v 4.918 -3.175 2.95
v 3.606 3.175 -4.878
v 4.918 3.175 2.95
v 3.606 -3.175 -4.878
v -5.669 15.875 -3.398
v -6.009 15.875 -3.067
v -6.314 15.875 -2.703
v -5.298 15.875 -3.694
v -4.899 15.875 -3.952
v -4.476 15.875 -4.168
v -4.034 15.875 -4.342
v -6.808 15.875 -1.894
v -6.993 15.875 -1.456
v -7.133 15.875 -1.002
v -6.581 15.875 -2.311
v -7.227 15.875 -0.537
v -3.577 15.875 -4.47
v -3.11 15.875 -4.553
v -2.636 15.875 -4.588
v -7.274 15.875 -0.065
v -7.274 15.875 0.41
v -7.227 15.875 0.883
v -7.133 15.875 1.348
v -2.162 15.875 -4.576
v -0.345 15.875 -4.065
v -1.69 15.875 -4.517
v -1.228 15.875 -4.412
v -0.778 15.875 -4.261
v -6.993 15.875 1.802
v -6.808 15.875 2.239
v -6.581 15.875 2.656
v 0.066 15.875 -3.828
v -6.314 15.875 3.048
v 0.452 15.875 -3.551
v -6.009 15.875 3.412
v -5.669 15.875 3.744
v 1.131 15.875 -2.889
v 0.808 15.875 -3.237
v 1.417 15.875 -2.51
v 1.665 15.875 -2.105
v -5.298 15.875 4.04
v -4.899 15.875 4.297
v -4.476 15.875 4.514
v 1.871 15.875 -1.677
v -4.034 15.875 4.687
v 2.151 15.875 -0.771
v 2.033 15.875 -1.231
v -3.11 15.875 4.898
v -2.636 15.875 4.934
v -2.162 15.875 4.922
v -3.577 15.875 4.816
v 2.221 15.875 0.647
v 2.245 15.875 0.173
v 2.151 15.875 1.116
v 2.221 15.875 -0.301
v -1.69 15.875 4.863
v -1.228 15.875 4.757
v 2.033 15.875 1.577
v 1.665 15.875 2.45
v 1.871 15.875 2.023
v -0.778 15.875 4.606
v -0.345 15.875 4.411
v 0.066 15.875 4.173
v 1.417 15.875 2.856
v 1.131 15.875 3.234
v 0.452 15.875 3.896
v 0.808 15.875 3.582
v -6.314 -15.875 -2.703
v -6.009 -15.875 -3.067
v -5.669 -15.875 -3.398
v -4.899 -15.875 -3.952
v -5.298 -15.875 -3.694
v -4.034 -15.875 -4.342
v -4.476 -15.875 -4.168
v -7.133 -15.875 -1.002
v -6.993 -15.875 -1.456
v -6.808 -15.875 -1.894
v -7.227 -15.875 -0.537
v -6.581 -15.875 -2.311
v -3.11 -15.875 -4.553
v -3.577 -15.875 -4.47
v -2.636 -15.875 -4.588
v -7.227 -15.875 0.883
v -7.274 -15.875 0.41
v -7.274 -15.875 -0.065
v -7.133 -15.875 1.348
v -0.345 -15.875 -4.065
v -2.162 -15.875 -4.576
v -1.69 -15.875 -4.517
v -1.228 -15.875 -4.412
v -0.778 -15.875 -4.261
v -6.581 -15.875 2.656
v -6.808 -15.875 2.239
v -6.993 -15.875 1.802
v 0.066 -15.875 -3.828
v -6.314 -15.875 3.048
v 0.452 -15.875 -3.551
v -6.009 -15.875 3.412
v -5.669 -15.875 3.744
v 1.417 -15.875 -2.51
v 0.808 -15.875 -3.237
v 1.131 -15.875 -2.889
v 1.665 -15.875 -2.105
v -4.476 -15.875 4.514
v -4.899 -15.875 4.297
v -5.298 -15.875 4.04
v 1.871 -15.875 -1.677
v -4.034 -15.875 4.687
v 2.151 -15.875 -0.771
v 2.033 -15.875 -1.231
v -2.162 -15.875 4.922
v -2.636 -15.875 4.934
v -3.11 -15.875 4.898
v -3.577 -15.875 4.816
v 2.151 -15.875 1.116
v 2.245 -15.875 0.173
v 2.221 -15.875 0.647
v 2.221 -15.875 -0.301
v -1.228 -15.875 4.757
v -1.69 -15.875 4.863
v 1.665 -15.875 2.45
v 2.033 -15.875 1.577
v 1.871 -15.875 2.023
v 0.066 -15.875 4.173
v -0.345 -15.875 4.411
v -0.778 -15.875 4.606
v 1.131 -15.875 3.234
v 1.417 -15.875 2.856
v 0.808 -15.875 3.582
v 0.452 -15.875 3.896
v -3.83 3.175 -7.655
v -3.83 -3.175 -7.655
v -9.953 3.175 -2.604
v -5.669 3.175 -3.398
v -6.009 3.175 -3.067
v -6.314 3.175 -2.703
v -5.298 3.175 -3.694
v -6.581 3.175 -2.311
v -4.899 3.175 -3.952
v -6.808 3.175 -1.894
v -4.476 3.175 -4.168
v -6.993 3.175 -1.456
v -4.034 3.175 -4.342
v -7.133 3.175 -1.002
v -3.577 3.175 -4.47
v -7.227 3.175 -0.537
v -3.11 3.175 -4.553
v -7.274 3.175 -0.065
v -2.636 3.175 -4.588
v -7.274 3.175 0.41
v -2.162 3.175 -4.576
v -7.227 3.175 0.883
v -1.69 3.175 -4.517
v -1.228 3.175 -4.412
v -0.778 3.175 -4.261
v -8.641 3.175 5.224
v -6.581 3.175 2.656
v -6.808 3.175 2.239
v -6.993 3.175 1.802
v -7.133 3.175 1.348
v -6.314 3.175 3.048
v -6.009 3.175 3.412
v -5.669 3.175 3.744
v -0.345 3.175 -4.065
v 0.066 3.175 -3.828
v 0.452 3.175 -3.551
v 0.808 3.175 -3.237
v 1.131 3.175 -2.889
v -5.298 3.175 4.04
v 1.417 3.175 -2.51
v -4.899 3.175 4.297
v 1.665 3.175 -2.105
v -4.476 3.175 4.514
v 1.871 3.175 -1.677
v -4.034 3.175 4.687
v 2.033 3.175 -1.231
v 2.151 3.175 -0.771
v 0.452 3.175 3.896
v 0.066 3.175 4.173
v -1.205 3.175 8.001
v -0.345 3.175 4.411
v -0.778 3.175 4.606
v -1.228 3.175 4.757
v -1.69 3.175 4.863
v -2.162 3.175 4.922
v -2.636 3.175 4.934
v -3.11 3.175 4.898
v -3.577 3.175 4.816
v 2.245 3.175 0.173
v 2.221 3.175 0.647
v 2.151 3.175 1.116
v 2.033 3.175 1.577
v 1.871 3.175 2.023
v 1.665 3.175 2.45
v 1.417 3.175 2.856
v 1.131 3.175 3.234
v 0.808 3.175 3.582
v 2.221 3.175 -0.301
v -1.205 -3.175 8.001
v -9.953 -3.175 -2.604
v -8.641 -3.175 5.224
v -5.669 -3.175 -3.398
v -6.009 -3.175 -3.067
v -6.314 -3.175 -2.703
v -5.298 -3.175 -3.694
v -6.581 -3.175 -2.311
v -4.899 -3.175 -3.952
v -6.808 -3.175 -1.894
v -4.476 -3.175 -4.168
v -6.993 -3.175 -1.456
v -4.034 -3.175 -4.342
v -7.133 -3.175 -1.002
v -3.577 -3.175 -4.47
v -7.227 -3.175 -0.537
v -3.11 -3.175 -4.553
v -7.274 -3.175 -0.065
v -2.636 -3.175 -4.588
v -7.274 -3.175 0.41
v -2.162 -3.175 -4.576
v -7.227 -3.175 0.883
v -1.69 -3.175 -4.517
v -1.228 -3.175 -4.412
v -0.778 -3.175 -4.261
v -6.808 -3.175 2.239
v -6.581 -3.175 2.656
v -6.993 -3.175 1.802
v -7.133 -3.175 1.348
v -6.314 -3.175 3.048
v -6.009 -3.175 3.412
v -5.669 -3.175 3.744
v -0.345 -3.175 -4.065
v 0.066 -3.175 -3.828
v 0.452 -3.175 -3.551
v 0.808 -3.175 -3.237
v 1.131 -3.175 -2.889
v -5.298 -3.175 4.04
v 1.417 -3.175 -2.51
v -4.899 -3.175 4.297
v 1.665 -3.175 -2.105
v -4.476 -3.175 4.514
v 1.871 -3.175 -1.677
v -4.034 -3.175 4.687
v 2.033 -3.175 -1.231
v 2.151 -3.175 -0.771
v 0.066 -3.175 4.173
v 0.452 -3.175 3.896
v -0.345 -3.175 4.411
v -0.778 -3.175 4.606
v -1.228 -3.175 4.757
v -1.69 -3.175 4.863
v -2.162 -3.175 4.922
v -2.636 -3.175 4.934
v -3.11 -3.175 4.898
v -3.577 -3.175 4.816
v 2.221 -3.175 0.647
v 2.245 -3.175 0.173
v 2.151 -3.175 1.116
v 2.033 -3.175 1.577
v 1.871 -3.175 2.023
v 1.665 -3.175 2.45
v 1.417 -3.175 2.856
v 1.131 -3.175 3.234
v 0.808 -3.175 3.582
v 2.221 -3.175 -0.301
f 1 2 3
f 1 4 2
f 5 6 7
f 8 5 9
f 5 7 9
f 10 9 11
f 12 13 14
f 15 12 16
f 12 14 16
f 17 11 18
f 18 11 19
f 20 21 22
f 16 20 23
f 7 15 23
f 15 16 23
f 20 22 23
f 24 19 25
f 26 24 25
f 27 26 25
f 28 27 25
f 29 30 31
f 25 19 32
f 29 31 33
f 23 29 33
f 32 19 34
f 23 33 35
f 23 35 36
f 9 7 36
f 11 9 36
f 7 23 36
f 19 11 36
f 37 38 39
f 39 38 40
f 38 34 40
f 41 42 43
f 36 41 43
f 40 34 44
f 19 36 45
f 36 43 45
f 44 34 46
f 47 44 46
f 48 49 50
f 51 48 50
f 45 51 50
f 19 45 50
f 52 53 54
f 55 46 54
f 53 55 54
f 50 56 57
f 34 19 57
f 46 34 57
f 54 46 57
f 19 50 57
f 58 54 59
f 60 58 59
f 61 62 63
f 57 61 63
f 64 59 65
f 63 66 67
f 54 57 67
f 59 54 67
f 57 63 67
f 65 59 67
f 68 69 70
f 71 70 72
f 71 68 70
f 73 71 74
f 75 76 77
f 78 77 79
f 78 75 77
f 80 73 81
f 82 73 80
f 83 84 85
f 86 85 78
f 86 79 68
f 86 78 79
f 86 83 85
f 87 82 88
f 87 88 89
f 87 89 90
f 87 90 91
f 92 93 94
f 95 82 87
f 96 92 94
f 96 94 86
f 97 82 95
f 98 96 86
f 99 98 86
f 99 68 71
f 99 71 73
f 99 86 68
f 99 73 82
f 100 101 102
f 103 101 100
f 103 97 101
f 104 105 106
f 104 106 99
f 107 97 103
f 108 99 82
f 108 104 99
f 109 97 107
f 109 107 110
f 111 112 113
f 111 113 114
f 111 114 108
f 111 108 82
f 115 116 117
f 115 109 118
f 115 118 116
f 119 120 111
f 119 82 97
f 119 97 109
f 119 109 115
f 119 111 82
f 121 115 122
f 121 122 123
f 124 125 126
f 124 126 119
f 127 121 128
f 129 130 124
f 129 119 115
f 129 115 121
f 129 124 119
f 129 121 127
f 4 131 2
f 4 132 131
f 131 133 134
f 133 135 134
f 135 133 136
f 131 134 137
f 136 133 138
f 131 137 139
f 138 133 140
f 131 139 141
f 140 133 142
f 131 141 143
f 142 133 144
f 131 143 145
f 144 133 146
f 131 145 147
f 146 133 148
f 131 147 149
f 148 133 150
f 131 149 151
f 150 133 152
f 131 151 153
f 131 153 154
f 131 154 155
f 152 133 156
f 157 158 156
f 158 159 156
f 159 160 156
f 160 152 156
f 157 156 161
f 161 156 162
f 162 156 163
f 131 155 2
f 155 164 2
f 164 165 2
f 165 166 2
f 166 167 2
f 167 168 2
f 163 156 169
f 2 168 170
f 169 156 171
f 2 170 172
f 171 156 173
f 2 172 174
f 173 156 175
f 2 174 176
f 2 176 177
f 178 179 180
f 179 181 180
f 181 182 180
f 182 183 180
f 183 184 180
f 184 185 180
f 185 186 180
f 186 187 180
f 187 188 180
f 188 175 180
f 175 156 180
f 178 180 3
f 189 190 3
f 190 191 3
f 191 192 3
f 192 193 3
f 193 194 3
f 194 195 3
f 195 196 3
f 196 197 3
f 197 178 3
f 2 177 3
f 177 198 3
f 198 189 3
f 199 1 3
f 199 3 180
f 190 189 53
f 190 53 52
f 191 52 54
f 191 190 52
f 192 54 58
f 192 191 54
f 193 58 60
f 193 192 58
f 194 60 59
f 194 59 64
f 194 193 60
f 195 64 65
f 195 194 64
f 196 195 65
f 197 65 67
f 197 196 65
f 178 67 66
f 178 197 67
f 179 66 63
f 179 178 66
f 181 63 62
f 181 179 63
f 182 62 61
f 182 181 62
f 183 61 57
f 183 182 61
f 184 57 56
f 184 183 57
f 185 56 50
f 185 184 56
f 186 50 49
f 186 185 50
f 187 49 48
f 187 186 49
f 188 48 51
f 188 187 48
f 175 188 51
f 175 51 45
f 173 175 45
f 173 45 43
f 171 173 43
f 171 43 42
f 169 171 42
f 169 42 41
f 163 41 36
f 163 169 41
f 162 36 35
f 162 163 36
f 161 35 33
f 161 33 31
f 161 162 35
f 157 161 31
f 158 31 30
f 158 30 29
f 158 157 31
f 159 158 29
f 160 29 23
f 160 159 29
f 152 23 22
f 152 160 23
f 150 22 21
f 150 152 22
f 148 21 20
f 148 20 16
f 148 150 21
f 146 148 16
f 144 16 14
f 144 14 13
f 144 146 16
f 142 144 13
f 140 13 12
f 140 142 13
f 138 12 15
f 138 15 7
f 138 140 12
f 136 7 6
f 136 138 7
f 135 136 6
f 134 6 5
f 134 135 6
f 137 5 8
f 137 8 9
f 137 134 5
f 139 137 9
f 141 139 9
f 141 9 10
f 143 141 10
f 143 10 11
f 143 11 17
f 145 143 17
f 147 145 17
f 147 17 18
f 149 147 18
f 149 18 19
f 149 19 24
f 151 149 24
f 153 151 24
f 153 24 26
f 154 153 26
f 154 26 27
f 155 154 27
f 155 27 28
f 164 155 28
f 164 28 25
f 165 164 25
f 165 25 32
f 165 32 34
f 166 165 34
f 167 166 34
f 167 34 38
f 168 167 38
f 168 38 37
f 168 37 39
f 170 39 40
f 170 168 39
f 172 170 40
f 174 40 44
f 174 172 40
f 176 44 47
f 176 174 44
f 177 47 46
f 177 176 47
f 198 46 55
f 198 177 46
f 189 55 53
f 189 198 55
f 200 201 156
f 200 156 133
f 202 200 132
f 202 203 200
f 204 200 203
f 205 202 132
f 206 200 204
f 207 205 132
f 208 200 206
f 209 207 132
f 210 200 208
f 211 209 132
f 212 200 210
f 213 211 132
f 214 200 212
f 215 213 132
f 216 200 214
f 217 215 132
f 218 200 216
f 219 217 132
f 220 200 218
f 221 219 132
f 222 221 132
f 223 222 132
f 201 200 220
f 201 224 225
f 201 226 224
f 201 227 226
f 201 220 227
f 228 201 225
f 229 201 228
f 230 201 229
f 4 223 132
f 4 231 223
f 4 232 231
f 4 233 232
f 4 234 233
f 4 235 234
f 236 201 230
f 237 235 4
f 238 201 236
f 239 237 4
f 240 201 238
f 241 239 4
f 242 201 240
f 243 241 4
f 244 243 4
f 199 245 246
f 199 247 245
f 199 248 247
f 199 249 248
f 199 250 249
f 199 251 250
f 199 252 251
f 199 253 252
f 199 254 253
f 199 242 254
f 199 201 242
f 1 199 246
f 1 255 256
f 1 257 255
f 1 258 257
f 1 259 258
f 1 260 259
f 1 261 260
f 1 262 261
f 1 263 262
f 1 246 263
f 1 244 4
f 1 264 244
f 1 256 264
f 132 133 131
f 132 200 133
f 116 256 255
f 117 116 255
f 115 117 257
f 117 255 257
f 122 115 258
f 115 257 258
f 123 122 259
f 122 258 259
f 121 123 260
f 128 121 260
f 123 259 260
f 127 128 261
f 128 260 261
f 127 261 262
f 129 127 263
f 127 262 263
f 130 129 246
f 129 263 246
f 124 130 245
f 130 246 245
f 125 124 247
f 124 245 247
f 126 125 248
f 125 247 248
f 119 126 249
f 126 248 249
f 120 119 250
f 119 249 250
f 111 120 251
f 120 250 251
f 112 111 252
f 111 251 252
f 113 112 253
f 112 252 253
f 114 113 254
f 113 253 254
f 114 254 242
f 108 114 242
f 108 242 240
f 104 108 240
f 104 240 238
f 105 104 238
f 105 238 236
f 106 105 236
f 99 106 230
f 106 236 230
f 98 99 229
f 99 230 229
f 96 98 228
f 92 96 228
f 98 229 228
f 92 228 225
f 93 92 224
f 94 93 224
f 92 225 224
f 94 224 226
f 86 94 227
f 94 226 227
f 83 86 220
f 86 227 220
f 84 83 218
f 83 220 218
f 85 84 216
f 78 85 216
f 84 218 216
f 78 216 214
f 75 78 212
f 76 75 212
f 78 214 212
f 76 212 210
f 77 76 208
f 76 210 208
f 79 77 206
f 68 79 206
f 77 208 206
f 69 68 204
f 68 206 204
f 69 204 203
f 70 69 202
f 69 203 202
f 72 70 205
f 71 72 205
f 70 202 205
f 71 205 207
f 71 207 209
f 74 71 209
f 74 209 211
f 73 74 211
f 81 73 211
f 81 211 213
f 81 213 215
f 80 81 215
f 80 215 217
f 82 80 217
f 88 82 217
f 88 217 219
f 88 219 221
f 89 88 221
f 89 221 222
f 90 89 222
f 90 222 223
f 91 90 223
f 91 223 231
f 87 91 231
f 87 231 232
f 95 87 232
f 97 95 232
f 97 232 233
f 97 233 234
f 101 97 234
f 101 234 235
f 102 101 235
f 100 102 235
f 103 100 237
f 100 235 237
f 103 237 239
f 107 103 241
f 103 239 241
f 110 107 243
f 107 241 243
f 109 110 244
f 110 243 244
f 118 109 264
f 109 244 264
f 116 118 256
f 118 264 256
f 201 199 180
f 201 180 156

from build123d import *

# Parameters (mm, degrees)
F1_DEPTH = 6.35
F2_R     = 9.525
F3_DEPTH = 25.4
F5_SCALE = 0.5


with BuildPart() as f1:
    # F0 (on Front) → F1 (new body)
    with BuildSketch(Plane.XZ):
        Polygon((7.211127909, -9.756404553), (9.8366258623, 5.8999802627), (-2.4094521428, 16.0019205958), (-17.2810281013, 10.4474761131), (-19.9065260547, -5.2089087026), (-7.6604480495, -15.3108490356), align=None)
    extrude(amount=F1_DEPTH)

    # F2 (on face) → F3 (join)
    with BuildSketch(Plane.XZ.offset(6.35)):
        with Locations((-5.0349500962, 0.3455357801)):
            Circle(F2_R)
    extrude(amount=F3_DEPTH)

    # F4: F1 across face


with BuildPart() as f1_1:
    add(f1.part)
    add(f1.part.mirror(Plane(origin=(-5.0349500962, 0, 0.3455357801), x_dir=(1, 0, 0), z_dir=(0, 1, 0))))


with BuildPart() as f1_2:
    # F5: moved
    add(f1_1.part.scale(F5_SCALE))


solid = f1_2.part
